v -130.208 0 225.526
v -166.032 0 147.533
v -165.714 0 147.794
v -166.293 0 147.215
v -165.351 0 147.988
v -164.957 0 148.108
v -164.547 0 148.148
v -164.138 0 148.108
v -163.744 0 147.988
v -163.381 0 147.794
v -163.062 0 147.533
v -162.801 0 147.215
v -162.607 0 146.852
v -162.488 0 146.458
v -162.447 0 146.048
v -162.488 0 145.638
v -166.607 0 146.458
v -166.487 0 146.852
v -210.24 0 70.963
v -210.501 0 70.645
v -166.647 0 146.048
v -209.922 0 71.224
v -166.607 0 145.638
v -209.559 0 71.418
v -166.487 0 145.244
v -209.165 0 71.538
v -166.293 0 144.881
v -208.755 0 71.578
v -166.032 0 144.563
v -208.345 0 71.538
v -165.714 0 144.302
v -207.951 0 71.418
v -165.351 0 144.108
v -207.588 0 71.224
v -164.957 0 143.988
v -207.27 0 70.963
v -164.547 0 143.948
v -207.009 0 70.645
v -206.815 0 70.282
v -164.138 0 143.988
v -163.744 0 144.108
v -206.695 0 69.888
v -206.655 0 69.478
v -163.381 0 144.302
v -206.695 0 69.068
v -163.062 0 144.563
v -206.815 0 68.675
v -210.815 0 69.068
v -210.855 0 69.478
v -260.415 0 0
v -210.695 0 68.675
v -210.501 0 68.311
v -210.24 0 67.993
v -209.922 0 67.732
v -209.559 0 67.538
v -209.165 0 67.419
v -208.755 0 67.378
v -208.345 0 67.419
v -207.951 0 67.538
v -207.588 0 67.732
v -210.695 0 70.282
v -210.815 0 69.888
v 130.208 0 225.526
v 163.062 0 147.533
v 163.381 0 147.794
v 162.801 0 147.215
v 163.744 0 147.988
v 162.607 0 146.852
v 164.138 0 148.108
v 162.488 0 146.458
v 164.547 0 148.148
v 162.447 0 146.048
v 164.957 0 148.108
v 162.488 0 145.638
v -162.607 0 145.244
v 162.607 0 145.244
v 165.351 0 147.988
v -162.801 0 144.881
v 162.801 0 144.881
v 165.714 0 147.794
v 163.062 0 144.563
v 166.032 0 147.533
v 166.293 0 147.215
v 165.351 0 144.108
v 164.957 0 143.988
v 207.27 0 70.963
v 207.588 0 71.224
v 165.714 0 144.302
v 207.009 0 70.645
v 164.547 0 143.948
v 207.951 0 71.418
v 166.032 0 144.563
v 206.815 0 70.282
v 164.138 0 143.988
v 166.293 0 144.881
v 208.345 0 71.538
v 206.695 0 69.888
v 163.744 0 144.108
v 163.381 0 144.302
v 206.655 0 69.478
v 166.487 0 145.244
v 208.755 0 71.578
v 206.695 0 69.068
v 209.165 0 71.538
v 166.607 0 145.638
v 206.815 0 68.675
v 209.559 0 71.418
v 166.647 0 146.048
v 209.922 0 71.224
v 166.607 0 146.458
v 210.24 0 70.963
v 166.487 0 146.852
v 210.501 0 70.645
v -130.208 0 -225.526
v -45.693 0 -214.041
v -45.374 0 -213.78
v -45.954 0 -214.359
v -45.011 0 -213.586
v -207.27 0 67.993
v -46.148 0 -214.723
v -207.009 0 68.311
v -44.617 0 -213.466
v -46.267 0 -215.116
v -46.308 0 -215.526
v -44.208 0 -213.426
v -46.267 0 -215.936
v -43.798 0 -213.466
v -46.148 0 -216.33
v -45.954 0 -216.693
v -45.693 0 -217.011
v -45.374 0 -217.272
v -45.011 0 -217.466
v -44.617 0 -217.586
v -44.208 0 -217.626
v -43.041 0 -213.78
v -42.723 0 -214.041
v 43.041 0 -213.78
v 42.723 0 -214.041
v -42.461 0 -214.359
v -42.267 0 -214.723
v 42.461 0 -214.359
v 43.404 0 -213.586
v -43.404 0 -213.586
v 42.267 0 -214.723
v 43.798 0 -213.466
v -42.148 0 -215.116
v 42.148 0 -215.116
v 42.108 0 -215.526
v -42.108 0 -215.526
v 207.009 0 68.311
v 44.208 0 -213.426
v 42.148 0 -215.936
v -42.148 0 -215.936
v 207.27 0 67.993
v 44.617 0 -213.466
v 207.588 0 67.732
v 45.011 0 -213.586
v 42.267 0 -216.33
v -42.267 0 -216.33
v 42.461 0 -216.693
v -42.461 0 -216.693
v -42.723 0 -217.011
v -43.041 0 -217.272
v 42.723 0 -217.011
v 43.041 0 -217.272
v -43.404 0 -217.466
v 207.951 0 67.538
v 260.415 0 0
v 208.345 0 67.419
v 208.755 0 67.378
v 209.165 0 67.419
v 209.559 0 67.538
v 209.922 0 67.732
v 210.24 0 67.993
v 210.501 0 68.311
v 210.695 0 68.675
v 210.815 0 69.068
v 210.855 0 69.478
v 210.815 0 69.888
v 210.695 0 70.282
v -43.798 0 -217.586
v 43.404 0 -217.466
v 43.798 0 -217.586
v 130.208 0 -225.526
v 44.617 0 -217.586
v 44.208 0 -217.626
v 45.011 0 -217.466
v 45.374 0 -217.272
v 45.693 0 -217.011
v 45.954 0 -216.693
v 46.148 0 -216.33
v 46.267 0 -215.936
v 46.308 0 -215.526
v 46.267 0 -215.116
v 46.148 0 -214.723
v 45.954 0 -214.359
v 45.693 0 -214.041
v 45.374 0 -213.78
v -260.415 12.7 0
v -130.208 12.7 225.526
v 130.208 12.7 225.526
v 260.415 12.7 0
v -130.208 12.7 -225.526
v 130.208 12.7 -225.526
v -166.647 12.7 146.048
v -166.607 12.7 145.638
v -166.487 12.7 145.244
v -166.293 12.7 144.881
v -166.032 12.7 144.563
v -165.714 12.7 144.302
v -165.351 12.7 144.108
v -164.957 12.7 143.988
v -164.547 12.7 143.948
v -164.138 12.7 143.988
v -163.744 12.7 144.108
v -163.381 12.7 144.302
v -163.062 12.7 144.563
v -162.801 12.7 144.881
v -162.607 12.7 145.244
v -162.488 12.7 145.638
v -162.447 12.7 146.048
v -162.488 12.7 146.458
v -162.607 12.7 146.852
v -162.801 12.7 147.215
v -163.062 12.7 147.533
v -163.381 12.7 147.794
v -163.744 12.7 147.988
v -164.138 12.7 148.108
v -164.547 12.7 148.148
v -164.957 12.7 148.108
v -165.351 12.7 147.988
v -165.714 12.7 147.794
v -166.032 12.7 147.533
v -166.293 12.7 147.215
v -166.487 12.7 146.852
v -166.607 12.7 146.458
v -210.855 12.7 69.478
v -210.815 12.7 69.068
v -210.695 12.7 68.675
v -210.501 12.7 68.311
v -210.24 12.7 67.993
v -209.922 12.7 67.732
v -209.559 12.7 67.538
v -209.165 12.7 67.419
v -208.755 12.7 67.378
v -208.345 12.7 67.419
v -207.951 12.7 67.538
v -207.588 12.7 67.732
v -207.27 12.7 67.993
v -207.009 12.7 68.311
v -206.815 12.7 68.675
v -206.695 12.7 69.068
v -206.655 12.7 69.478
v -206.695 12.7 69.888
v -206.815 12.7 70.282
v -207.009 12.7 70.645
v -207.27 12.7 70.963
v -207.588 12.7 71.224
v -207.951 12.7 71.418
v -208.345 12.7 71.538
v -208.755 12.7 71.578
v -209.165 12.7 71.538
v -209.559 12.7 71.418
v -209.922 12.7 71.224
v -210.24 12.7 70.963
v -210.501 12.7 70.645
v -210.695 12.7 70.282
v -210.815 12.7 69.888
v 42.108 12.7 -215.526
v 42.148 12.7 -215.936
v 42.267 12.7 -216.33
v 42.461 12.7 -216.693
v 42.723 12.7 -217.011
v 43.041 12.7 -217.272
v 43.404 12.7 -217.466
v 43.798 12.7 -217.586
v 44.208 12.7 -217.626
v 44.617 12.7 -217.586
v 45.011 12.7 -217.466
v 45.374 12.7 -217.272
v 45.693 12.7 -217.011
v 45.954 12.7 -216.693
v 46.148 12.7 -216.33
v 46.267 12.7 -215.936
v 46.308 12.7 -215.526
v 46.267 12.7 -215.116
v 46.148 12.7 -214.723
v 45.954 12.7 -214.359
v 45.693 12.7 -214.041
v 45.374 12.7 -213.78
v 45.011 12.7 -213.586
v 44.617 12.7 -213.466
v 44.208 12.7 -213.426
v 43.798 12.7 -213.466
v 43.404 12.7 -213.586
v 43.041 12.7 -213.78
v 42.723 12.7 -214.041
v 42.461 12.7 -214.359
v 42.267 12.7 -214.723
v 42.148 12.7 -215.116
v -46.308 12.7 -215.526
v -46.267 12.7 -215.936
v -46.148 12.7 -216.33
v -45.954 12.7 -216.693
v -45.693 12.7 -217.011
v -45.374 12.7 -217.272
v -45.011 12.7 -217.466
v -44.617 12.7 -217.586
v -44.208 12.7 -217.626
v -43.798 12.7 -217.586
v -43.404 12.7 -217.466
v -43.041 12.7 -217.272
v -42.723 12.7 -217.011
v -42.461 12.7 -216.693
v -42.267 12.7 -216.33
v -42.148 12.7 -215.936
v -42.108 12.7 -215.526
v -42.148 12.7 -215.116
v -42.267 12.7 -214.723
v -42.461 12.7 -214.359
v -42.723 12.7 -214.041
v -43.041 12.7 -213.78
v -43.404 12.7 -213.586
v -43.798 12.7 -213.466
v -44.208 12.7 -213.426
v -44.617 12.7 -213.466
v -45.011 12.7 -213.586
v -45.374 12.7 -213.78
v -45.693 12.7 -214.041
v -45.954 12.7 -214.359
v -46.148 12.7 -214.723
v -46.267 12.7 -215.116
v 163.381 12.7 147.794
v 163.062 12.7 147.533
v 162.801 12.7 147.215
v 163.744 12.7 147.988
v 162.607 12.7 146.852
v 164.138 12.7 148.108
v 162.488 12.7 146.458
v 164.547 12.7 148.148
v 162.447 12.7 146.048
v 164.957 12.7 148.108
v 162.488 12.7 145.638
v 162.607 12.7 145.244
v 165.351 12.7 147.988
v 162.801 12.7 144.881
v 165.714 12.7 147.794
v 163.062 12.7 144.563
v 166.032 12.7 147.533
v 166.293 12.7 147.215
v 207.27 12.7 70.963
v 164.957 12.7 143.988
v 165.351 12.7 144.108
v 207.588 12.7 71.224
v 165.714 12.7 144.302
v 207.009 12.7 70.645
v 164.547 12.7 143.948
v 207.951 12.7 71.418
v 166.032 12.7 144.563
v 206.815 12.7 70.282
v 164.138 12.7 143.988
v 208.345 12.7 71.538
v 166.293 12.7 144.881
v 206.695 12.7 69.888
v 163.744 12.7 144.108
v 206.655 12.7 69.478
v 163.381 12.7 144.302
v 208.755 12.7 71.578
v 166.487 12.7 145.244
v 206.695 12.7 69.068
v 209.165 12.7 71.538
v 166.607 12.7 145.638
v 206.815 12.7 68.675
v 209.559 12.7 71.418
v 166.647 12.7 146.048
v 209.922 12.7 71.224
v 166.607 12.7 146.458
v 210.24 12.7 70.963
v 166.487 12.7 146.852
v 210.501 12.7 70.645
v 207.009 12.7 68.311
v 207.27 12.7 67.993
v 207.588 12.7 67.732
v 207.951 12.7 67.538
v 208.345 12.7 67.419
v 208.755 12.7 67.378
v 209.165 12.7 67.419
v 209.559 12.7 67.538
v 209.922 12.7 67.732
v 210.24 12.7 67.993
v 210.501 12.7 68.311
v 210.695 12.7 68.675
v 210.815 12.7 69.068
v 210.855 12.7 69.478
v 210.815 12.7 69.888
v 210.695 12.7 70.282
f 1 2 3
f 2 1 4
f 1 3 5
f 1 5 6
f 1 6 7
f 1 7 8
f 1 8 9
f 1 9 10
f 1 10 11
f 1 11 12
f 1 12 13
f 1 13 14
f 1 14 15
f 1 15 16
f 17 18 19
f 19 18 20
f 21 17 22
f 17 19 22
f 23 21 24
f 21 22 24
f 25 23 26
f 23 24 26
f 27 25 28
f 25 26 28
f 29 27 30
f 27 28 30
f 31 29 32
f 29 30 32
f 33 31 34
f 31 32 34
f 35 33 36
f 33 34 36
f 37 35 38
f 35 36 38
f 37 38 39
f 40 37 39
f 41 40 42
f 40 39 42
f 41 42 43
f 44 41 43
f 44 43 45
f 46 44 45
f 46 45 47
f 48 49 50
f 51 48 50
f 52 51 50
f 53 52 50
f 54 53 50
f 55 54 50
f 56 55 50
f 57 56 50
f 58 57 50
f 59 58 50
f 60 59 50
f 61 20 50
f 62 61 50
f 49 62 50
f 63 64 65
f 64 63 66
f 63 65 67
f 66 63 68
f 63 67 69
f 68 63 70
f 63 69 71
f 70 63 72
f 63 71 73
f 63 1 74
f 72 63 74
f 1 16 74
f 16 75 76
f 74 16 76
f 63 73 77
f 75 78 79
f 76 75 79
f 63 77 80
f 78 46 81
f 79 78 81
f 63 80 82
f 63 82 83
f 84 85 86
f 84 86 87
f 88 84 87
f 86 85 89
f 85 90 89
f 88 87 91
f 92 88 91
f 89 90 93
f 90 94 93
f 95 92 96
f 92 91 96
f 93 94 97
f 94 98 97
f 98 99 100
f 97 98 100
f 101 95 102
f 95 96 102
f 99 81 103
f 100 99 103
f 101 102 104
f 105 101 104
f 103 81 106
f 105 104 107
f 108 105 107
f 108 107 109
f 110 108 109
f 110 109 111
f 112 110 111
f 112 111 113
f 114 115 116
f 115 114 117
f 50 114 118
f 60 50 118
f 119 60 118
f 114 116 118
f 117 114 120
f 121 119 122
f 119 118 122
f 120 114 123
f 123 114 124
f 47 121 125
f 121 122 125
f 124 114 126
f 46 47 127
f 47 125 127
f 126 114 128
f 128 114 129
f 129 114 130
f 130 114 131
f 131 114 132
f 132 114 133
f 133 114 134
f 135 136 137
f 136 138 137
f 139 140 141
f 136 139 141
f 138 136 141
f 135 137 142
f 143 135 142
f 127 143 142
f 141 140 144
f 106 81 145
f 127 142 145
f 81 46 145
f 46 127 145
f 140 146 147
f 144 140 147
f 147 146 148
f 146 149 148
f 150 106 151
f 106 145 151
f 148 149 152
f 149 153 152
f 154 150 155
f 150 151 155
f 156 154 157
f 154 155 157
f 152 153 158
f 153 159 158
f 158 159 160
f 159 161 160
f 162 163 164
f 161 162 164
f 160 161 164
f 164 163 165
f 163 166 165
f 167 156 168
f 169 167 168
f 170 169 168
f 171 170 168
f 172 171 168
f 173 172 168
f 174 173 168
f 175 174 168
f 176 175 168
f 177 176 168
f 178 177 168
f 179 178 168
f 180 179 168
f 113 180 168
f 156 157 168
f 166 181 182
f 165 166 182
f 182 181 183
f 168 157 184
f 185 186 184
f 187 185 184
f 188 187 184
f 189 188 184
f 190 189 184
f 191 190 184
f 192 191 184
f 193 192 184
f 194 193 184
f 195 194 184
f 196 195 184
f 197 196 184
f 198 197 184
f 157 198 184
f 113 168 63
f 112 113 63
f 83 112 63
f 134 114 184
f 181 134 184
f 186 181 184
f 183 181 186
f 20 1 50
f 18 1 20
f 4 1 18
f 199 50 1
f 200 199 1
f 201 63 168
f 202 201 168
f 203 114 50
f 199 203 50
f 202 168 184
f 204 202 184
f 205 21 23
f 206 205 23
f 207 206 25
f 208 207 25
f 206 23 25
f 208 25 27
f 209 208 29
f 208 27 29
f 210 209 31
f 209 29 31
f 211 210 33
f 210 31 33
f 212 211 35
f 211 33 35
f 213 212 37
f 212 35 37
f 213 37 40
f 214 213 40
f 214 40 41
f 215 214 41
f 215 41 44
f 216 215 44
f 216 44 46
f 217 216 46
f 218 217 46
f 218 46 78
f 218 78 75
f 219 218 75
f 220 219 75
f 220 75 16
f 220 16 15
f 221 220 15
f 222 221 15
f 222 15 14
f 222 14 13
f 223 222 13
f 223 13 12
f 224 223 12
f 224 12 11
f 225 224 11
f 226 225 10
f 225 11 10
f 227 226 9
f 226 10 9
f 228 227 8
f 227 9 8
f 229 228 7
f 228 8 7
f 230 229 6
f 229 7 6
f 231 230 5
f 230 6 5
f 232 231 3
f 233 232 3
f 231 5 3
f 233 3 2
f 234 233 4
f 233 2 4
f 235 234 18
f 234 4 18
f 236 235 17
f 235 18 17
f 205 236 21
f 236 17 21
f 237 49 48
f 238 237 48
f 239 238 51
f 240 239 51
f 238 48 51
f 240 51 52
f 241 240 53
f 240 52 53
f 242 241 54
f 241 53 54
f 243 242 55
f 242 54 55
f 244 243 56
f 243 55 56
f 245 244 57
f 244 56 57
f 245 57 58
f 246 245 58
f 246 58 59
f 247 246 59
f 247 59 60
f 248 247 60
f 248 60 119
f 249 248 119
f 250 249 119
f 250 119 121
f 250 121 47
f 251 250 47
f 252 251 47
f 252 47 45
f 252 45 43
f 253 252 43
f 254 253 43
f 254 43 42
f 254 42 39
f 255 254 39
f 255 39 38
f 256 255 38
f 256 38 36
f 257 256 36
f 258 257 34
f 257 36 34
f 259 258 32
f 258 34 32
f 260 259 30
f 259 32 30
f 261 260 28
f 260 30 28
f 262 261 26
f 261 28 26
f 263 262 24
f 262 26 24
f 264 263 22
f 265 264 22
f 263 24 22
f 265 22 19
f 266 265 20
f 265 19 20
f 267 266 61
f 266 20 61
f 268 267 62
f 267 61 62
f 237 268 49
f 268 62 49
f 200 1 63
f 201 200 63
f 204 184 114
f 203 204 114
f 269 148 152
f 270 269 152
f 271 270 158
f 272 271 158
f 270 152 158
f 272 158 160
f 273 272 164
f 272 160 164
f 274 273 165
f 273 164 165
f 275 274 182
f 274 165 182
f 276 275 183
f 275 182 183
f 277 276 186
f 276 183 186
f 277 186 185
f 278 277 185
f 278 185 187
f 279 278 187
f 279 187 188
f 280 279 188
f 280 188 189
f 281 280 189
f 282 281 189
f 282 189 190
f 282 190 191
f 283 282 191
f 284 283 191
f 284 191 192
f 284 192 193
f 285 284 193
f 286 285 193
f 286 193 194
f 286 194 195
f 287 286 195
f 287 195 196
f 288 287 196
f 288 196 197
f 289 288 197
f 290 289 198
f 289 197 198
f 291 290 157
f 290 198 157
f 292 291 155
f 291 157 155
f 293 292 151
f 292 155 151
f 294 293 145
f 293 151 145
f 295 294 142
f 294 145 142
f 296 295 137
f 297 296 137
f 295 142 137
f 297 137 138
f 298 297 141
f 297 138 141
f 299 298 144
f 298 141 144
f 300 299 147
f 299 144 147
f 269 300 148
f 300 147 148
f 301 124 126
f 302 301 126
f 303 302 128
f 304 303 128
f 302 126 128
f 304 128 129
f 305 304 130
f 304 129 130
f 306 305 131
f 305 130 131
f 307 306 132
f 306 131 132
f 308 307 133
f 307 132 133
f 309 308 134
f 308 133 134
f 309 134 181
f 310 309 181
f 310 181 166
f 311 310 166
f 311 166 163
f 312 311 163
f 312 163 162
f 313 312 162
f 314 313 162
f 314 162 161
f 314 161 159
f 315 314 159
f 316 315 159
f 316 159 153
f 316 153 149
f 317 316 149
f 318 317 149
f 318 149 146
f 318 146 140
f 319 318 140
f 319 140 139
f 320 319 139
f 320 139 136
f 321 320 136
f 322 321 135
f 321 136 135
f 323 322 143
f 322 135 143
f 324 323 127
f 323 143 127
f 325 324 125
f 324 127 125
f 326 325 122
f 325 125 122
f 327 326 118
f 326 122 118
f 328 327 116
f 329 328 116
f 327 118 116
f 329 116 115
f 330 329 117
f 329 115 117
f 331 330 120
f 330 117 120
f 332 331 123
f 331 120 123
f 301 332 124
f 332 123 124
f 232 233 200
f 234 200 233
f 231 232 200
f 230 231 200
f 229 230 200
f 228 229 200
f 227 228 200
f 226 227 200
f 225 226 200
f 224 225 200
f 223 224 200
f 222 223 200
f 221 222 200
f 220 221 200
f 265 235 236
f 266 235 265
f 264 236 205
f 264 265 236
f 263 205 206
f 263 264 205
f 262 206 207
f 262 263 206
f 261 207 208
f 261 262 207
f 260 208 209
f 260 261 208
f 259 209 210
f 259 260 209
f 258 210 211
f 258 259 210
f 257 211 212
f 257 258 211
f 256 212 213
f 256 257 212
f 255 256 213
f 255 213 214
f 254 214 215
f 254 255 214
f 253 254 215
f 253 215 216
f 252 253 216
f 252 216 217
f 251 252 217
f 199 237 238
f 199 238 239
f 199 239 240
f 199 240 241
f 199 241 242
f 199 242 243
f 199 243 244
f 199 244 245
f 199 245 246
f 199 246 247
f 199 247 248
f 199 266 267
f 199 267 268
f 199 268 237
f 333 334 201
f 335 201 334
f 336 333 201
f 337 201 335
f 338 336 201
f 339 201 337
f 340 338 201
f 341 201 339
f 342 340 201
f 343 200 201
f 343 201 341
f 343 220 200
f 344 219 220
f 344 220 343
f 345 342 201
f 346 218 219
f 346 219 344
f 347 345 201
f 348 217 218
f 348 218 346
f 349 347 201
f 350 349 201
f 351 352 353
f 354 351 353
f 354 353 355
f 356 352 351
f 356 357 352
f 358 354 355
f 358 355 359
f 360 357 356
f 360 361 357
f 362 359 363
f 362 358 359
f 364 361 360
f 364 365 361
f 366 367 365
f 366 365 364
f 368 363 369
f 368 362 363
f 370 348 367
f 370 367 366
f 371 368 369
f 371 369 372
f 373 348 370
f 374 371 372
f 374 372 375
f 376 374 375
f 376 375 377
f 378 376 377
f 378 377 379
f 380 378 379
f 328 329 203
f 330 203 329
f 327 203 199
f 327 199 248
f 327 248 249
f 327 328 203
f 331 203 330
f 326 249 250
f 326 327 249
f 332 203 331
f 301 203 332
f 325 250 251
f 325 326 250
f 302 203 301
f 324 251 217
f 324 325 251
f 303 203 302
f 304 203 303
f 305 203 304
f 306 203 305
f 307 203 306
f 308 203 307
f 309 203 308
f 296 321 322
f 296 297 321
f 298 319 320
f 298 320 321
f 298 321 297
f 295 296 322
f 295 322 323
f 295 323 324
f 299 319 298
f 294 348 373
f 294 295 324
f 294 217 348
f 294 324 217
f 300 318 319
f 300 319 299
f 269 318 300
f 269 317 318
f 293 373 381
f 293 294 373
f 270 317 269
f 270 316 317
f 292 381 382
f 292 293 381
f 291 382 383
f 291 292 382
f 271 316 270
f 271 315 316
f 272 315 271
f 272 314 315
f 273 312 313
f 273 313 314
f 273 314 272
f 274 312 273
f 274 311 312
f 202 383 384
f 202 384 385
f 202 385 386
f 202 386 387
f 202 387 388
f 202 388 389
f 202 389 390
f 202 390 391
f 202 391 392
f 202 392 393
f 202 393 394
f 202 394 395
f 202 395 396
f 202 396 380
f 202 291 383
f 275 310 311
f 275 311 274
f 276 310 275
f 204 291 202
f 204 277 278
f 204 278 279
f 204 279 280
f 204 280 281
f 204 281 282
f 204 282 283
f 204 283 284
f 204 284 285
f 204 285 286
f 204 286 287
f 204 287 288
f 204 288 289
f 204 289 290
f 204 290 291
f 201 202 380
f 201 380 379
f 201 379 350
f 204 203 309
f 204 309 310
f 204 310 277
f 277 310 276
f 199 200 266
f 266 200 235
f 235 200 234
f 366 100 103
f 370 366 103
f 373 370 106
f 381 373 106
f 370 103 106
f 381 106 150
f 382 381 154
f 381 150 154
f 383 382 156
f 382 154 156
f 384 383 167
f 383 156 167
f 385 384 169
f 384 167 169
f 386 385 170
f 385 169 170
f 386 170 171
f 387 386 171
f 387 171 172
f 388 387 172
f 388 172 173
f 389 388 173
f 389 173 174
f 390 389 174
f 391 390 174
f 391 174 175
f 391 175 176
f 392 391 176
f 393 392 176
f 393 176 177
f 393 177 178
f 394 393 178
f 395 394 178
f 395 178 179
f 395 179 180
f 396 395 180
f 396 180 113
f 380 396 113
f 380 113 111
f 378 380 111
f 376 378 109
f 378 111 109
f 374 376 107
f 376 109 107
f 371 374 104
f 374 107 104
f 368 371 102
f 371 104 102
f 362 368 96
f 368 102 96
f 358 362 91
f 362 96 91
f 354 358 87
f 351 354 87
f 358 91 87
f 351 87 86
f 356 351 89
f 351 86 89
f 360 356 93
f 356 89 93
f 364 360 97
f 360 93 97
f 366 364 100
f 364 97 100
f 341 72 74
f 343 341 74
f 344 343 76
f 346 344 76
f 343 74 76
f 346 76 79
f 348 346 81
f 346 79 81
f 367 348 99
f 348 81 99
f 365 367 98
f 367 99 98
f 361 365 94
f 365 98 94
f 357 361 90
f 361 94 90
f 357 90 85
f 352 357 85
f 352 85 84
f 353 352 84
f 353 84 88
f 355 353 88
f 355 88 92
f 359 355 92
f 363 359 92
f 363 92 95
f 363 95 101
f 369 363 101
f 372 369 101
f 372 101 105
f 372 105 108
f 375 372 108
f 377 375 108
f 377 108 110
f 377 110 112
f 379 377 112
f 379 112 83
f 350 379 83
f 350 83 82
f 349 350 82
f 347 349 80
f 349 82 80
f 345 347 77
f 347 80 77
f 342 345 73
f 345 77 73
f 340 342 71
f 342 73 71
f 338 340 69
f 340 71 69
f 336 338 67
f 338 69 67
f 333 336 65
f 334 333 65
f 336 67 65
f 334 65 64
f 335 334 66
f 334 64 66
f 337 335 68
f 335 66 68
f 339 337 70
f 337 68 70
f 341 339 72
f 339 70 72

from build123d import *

# Parameters (mm, degrees)
BOSS_EXTRUDE1_DEPTH         = 12.7
TAP_DRILL_FOR_M5X0_8_TAP1_D = 4.2


with BuildPart() as part:
    # Sketch1 → Boss-Extrude1 (new body)
    with BuildSketch(Plane(origin=(0, 0, 0), x_dir=(1, 0, 0), z_dir=(0, 1, 0))):
        Polygon((130.207581625, -225.526146906), (260.415163251, 0), (130.207581625, 225.526146906), (-130.207581625, 225.526146906), (-260.415163251, 0), (-130.207581625, -225.526146906), align=None)
    extrude(amount=BOSS_EXTRUDE1_DEPTH)

    # Tap Drill for M5x0.8 Tap1 (through all)
    with Locations(Plane(origin=(0, 12.7, 0), x_dir=(1, 0, 0), z_dir=(0, 1, 0))):
        with Locations((-44.207581625, 215.526146906), (44.207581625, 215.526146906), (-208.754909213, -69.478184725), (-164.547327587, -146.04796218), (164.547327587, -146.04796218), (208.754909213, -69.478184725)):
            Hole(TAP_DRILL_FOR_M5X0_8_TAP1_D / 2)


solid = part.part
